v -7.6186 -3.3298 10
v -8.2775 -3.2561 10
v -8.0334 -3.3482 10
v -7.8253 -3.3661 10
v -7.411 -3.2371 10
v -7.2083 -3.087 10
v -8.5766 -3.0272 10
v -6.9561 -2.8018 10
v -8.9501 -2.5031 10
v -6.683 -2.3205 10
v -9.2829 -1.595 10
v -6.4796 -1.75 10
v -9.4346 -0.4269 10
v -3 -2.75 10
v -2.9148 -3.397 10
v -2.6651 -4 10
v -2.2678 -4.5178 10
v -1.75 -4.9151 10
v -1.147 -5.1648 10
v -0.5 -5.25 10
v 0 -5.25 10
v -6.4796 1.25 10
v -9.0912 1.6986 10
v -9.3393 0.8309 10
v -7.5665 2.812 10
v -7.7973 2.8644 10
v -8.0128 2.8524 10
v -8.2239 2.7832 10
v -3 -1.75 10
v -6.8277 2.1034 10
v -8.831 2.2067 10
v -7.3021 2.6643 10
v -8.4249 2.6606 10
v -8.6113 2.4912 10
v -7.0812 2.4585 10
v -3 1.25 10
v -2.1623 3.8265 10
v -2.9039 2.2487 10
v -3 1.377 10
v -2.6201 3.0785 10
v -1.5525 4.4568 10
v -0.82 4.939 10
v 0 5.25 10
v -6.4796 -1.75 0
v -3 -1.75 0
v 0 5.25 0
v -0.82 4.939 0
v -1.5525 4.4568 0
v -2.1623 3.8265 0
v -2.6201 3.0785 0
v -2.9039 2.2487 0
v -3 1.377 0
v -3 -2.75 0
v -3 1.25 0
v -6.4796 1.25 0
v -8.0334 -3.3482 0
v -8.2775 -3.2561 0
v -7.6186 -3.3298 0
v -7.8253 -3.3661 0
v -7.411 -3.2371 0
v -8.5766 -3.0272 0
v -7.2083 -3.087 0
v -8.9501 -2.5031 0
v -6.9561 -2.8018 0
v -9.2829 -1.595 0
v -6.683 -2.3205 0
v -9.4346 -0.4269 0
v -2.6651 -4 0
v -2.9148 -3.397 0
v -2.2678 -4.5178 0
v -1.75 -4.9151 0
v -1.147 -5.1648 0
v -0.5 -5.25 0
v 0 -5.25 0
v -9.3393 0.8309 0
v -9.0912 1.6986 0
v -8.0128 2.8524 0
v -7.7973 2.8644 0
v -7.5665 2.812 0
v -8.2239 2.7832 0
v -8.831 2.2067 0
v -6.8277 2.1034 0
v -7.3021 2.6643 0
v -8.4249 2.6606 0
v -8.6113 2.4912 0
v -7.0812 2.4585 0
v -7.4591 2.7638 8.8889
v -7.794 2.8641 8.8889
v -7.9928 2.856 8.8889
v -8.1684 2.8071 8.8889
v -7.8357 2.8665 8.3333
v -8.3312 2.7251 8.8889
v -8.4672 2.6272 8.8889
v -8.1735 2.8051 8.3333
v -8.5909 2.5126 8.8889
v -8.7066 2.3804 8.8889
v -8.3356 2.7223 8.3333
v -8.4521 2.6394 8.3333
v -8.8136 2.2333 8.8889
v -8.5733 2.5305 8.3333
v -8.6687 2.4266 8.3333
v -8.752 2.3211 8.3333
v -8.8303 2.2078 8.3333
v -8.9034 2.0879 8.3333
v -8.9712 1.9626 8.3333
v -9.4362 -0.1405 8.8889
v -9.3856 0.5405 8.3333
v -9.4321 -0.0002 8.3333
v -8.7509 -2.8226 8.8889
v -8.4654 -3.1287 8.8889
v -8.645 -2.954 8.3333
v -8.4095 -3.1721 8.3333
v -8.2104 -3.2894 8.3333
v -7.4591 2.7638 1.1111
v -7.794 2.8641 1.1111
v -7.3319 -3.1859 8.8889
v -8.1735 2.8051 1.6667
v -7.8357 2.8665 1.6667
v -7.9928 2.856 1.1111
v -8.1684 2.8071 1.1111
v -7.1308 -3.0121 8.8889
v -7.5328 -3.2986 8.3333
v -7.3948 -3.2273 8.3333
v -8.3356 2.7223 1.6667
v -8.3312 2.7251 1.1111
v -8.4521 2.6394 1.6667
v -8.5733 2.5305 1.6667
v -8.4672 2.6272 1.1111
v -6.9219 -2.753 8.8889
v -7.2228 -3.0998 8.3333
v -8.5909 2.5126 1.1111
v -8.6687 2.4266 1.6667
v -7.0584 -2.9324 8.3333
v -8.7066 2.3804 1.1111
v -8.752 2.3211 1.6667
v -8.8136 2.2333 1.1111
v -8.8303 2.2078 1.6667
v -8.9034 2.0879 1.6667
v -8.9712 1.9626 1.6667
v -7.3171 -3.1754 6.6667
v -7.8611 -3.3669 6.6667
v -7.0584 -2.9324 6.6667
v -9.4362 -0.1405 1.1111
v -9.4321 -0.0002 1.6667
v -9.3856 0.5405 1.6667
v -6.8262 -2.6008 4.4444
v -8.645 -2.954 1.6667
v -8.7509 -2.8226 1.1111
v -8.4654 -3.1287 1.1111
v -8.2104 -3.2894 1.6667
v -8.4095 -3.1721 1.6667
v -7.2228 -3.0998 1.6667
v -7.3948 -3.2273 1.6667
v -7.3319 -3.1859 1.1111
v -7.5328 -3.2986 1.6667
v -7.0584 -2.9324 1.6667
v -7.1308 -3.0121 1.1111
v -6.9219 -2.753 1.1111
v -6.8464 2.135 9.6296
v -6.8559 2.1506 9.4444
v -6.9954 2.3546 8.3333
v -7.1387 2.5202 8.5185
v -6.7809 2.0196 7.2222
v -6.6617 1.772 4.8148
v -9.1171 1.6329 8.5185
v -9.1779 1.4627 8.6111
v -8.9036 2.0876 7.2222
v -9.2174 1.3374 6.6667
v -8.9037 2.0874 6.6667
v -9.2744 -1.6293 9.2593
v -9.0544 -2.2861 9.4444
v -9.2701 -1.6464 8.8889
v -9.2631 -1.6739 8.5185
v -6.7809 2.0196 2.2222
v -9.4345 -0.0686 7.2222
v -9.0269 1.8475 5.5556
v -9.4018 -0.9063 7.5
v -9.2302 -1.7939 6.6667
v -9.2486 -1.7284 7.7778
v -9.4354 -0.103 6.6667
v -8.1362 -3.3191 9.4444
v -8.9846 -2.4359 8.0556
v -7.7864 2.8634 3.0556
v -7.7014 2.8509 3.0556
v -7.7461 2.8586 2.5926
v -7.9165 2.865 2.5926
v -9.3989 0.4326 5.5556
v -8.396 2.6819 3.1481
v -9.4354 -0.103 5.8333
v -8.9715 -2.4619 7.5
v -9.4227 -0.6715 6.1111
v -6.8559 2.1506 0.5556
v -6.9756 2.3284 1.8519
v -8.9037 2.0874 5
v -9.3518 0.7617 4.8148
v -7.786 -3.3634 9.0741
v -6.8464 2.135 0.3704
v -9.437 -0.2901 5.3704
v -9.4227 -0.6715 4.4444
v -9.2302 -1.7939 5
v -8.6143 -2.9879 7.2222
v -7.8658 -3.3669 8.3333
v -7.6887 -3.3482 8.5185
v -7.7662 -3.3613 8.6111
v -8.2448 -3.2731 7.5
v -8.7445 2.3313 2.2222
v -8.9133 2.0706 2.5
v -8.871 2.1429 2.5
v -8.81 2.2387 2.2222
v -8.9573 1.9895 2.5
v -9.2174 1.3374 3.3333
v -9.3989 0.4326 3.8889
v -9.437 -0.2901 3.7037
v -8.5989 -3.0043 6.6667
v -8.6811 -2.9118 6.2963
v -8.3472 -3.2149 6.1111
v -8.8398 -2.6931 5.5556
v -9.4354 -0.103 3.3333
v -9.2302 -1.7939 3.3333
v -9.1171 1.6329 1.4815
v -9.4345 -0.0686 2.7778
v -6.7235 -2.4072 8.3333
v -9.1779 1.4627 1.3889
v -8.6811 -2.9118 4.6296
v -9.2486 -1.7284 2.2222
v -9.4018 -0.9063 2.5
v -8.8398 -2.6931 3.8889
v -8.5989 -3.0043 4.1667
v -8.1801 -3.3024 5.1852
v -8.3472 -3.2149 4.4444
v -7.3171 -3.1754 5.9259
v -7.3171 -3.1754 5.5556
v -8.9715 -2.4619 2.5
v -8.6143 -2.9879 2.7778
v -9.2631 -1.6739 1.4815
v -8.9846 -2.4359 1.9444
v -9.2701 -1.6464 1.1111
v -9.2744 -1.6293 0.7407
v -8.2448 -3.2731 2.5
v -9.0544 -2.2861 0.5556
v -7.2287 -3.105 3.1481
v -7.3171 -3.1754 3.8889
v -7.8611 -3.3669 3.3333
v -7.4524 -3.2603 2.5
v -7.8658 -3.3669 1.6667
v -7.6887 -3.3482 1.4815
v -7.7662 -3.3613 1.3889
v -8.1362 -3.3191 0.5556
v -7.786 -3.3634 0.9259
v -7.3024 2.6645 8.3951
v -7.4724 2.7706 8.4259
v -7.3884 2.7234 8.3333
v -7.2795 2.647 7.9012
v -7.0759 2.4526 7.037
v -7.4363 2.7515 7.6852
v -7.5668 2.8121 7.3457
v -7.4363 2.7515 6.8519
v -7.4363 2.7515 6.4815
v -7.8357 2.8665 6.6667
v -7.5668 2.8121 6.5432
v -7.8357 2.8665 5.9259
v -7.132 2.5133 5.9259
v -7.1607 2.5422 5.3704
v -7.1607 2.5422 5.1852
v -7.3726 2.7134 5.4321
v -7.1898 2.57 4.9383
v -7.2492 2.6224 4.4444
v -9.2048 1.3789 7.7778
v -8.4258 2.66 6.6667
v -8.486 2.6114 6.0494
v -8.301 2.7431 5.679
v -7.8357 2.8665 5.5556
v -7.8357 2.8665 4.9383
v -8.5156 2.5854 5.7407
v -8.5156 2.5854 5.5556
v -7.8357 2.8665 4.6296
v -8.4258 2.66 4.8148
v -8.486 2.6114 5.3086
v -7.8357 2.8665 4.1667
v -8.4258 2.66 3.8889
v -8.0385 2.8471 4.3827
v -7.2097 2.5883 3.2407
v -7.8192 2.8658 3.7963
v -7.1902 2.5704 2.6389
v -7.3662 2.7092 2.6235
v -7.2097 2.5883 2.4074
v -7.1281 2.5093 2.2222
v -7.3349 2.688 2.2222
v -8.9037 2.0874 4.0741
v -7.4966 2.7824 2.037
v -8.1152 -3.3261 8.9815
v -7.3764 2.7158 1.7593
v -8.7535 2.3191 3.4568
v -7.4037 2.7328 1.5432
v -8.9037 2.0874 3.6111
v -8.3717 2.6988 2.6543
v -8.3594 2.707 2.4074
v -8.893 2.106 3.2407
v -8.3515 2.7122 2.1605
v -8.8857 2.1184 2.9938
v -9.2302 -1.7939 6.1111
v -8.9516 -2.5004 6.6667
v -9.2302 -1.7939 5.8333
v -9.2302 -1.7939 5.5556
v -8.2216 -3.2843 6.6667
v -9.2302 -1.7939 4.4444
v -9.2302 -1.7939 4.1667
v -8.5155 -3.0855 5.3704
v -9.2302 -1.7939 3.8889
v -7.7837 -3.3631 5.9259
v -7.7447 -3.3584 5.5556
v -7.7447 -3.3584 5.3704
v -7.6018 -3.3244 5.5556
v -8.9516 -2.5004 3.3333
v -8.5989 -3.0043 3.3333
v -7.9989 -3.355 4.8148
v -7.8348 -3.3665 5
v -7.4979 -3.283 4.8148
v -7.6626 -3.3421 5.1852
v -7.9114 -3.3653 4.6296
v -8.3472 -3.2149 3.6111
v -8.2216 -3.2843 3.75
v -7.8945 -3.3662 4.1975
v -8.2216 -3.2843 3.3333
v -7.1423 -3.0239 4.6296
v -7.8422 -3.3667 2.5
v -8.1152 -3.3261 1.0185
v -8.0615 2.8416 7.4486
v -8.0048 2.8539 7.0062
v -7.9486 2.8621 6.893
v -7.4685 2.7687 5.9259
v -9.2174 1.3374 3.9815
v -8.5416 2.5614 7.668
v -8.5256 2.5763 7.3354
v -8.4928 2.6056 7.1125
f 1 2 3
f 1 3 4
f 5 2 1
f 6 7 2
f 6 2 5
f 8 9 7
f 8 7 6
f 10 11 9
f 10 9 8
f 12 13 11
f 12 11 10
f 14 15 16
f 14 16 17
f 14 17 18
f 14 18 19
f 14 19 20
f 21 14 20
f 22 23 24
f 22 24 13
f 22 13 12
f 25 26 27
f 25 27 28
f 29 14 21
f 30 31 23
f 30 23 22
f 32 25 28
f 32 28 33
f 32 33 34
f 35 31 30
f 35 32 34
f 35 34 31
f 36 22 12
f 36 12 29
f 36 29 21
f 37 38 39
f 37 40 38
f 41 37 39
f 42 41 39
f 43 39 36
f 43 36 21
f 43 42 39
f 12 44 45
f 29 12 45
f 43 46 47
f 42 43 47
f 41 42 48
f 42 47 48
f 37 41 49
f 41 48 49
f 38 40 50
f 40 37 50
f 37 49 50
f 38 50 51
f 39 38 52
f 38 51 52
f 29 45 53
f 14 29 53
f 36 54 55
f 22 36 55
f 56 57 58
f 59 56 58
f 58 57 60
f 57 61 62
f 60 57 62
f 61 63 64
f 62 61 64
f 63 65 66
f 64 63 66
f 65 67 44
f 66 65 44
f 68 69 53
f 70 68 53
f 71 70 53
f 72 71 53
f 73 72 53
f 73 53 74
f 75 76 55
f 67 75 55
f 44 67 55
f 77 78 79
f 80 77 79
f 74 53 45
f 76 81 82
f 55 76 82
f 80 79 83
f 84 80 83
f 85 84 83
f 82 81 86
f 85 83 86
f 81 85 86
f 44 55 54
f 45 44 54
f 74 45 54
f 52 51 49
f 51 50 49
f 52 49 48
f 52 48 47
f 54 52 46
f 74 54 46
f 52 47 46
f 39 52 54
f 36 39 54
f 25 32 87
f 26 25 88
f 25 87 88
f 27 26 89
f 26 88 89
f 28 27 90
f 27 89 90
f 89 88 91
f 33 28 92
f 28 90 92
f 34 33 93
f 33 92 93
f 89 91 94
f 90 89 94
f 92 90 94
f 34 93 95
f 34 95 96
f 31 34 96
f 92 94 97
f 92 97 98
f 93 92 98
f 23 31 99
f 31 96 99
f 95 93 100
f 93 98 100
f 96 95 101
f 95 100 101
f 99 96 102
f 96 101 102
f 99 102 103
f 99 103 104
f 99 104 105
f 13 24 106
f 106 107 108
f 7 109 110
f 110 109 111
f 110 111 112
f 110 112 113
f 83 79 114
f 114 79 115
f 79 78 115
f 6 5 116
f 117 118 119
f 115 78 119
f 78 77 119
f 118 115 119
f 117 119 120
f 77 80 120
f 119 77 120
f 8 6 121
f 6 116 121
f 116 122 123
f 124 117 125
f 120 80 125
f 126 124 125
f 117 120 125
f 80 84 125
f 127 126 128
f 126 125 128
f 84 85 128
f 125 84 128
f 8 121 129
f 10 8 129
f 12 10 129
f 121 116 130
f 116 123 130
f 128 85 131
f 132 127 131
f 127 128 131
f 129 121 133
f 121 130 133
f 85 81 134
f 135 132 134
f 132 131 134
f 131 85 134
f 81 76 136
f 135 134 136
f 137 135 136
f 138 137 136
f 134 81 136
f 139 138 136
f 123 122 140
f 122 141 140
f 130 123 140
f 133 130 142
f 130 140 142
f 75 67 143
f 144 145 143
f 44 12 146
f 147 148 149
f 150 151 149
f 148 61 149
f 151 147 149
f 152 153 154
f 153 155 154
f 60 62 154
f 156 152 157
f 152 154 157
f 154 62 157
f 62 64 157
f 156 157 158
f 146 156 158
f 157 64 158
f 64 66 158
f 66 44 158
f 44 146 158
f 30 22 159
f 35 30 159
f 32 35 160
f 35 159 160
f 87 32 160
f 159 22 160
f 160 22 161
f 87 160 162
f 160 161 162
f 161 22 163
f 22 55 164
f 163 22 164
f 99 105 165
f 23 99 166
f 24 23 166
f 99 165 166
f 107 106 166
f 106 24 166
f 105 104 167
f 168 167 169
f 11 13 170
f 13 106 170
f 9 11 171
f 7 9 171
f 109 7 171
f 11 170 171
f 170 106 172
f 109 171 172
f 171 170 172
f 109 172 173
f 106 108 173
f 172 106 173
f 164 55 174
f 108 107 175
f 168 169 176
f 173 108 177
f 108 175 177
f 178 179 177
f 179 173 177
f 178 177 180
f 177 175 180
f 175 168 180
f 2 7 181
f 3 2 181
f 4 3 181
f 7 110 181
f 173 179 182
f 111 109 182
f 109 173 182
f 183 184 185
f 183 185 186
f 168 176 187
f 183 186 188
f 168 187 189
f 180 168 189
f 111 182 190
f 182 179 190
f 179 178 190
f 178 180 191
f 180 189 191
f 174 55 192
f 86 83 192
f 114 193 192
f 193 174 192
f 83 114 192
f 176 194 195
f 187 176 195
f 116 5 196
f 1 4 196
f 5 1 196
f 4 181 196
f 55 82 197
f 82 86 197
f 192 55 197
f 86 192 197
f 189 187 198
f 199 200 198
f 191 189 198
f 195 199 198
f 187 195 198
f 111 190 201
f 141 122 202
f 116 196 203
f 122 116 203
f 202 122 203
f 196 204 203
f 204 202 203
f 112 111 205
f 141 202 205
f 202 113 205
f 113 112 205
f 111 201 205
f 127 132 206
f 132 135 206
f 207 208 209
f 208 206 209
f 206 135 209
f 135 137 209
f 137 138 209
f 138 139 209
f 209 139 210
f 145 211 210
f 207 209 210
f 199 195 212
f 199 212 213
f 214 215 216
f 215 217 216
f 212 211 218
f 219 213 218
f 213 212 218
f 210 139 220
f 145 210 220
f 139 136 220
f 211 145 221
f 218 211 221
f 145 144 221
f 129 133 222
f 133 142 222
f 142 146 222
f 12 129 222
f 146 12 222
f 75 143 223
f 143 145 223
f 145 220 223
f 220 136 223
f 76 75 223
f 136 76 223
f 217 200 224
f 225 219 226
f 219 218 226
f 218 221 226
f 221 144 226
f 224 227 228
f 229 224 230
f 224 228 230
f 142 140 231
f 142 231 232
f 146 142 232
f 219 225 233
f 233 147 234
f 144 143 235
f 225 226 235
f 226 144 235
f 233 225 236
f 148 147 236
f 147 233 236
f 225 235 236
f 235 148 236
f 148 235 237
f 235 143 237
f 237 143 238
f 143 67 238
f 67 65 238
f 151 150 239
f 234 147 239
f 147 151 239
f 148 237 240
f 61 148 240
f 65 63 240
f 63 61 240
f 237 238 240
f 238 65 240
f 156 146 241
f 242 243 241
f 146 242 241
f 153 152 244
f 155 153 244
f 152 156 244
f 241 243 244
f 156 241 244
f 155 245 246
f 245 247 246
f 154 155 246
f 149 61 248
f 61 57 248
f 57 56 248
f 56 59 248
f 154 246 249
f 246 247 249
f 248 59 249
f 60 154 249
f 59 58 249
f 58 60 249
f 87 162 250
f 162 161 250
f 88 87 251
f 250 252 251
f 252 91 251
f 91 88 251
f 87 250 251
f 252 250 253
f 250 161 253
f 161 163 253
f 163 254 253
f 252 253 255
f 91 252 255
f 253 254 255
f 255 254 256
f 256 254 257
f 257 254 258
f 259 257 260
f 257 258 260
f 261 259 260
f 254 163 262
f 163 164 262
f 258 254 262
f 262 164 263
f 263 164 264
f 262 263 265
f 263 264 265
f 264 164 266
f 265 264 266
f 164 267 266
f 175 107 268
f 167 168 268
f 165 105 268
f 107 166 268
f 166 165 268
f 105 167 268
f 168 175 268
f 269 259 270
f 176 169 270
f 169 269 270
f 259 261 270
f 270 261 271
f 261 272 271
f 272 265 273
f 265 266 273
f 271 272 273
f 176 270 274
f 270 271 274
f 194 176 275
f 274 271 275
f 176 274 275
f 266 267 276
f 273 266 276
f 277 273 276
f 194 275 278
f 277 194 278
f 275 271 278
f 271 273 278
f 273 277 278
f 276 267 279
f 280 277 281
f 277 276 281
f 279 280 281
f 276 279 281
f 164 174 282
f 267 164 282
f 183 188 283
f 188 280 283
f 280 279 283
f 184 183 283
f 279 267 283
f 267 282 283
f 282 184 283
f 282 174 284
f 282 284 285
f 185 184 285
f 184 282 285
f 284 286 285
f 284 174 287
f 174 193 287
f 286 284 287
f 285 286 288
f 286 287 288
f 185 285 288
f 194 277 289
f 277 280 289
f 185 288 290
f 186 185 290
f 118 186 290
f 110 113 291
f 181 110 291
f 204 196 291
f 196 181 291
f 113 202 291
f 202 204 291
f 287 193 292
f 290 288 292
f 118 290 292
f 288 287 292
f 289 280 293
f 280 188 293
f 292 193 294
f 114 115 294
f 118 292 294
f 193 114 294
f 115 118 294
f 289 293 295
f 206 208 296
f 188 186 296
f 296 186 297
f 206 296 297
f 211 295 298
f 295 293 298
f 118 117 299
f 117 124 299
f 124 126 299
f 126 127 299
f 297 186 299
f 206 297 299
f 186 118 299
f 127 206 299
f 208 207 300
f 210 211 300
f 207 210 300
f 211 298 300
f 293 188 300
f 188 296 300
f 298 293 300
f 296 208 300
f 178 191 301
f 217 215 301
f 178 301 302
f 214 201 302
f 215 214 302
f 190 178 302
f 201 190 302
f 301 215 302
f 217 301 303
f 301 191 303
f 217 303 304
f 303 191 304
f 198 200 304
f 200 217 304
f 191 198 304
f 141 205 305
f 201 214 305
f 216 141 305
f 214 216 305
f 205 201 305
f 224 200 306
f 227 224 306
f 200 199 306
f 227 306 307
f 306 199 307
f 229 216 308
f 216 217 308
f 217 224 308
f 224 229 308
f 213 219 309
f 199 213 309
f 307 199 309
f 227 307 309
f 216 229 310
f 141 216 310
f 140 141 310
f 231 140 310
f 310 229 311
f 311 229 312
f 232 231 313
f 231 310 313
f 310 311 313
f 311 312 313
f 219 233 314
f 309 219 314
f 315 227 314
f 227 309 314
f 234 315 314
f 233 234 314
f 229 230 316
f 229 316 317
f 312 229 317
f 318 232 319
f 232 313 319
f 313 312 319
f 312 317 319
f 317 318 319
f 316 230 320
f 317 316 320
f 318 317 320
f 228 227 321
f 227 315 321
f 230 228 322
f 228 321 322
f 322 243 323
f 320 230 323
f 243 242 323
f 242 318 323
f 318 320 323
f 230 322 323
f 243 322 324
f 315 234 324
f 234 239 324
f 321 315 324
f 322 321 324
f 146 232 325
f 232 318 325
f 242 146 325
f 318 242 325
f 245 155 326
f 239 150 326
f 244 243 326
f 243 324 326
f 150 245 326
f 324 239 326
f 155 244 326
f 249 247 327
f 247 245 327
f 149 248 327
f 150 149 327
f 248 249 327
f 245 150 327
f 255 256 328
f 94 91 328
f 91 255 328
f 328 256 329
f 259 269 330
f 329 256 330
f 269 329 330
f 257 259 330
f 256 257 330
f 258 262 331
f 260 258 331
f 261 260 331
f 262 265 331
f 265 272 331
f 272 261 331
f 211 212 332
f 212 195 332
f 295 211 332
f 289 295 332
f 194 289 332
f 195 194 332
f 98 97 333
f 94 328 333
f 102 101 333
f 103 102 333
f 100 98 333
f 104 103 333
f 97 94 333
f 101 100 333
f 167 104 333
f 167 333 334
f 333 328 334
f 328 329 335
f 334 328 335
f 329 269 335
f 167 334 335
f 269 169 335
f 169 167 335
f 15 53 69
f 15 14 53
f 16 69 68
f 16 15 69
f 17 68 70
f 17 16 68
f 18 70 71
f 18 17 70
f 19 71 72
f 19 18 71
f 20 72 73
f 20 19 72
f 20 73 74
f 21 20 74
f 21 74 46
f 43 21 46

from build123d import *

# Parameters (mm, degrees)
F1_DEPTH    = 10
F2_DEPTH    = 10
F3_T1_DEPTH = 29.364916731
F4_R        = 2.5


# Not quite as in the source:
# - a fillet or chamfer that OpenCascade refuses, or shapes differently, is made with other operations: its cross-section is extruded or revolved along the edge and cut away or added


with BuildPart() as f1:
    # F0 (on Top) → F1 (new body)
    with BuildSketch(Plane.XY):
        with BuildLine():
            Line((0, -5.25), (0, 0))
            Line((0, 0), (0, 5.25))
            Line((0, 5.25), (-3, 5.25))
            Line((-3, 5.25), (-3, 1.25))
            Line((-3, 1.25), (-6.479551384, 1.25))
            add(Edge.make_bspline(
                [(-6.479551384, -1.75), (-6.0631503018, -0.25), (-6.479551384, 1.25)],
                knots=[1.0687204508, 1.0687204508, 1.0687204508, 2.0728722028, 2.0728722028, 2.0728722028], degree=2, weights=[1, 0.8765854438, 1]))
            Line((-6.479551384, -1.75), (-3, -1.75))
            Line((-3, -1.75), (-3, -5.25))
            Line((-3, -5.25), (0, -5.25))
        make_face()
    extrude(amount=F1_DEPTH)

    # F0 (on Top) → F2 (join)
    with BuildSketch(Plane.XY):
        with BuildLine():
            add(Edge.make_bspline(
                [(-6.479551384, -1.75), (-6.0631503018, -0.25), (-6.479551384, 1.25)],
                knots=[1.0687204508, 1.0687204508, 1.0687204508, 2.0728722028, 2.0728722028, 2.0728722028], degree=2, weights=[1, 0.8765854438, 1]))
            add(Edge.make_bspline(
                [(-6.479551384, 1.25), (-7.8097391813, 6.0417303318), (-9.2174427731, 1.3374114859), (-10.6251463649, -3.36690736), (-7.8610982746, -3.36690736)],
                knots=[2.0728722028, 2.0728722028, 2.0728722028, 4.178028755, 4.178028755, 6.2831853072, 6.2831853072, 6.2831853072], degree=2, weights=[1, 0.49533294, 1, 0.49533294, 1]))
            add(Edge.make_bspline(
                [(-7.8610982746, -3.36690736), (-6.9284060337, -3.36690736), (-6.479551384, -1.75)],
                knots=[0, 0, 0, 1.0687204508, 1.0687204508, 1.0687204508], degree=2, weights=[1, 0.8605946365, 1]))
        make_face()
    extrude(amount=F2_DEPTH)

    # F3: fillet of radius 4 on 1 edges, made by hand

    # F3_s2 → F3_t1 (cut)
    with BuildSketch(Plane.XY.offset(-9.6824583655)):
        with BuildLine():
            ThreePointArc((0, 5.25), (-2.1622776602, 3.8265063966), (-3, 1.3770166538))
            Line((-3, 1.3770166538), (-3, 5.25))
            Line((-3, 5.25), (0, 5.25))
        make_face()
    extrude(amount=F3_T1_DEPTH, mode=Mode.SUBTRACT)

    # F4
    f4_edges = [f1.edges().sort_by_distance(p)[0] for p in [
        (-3, -5.25, 5),
    ]]
    fillet(f4_edges, radius=F4_R)


solid = f1.part
